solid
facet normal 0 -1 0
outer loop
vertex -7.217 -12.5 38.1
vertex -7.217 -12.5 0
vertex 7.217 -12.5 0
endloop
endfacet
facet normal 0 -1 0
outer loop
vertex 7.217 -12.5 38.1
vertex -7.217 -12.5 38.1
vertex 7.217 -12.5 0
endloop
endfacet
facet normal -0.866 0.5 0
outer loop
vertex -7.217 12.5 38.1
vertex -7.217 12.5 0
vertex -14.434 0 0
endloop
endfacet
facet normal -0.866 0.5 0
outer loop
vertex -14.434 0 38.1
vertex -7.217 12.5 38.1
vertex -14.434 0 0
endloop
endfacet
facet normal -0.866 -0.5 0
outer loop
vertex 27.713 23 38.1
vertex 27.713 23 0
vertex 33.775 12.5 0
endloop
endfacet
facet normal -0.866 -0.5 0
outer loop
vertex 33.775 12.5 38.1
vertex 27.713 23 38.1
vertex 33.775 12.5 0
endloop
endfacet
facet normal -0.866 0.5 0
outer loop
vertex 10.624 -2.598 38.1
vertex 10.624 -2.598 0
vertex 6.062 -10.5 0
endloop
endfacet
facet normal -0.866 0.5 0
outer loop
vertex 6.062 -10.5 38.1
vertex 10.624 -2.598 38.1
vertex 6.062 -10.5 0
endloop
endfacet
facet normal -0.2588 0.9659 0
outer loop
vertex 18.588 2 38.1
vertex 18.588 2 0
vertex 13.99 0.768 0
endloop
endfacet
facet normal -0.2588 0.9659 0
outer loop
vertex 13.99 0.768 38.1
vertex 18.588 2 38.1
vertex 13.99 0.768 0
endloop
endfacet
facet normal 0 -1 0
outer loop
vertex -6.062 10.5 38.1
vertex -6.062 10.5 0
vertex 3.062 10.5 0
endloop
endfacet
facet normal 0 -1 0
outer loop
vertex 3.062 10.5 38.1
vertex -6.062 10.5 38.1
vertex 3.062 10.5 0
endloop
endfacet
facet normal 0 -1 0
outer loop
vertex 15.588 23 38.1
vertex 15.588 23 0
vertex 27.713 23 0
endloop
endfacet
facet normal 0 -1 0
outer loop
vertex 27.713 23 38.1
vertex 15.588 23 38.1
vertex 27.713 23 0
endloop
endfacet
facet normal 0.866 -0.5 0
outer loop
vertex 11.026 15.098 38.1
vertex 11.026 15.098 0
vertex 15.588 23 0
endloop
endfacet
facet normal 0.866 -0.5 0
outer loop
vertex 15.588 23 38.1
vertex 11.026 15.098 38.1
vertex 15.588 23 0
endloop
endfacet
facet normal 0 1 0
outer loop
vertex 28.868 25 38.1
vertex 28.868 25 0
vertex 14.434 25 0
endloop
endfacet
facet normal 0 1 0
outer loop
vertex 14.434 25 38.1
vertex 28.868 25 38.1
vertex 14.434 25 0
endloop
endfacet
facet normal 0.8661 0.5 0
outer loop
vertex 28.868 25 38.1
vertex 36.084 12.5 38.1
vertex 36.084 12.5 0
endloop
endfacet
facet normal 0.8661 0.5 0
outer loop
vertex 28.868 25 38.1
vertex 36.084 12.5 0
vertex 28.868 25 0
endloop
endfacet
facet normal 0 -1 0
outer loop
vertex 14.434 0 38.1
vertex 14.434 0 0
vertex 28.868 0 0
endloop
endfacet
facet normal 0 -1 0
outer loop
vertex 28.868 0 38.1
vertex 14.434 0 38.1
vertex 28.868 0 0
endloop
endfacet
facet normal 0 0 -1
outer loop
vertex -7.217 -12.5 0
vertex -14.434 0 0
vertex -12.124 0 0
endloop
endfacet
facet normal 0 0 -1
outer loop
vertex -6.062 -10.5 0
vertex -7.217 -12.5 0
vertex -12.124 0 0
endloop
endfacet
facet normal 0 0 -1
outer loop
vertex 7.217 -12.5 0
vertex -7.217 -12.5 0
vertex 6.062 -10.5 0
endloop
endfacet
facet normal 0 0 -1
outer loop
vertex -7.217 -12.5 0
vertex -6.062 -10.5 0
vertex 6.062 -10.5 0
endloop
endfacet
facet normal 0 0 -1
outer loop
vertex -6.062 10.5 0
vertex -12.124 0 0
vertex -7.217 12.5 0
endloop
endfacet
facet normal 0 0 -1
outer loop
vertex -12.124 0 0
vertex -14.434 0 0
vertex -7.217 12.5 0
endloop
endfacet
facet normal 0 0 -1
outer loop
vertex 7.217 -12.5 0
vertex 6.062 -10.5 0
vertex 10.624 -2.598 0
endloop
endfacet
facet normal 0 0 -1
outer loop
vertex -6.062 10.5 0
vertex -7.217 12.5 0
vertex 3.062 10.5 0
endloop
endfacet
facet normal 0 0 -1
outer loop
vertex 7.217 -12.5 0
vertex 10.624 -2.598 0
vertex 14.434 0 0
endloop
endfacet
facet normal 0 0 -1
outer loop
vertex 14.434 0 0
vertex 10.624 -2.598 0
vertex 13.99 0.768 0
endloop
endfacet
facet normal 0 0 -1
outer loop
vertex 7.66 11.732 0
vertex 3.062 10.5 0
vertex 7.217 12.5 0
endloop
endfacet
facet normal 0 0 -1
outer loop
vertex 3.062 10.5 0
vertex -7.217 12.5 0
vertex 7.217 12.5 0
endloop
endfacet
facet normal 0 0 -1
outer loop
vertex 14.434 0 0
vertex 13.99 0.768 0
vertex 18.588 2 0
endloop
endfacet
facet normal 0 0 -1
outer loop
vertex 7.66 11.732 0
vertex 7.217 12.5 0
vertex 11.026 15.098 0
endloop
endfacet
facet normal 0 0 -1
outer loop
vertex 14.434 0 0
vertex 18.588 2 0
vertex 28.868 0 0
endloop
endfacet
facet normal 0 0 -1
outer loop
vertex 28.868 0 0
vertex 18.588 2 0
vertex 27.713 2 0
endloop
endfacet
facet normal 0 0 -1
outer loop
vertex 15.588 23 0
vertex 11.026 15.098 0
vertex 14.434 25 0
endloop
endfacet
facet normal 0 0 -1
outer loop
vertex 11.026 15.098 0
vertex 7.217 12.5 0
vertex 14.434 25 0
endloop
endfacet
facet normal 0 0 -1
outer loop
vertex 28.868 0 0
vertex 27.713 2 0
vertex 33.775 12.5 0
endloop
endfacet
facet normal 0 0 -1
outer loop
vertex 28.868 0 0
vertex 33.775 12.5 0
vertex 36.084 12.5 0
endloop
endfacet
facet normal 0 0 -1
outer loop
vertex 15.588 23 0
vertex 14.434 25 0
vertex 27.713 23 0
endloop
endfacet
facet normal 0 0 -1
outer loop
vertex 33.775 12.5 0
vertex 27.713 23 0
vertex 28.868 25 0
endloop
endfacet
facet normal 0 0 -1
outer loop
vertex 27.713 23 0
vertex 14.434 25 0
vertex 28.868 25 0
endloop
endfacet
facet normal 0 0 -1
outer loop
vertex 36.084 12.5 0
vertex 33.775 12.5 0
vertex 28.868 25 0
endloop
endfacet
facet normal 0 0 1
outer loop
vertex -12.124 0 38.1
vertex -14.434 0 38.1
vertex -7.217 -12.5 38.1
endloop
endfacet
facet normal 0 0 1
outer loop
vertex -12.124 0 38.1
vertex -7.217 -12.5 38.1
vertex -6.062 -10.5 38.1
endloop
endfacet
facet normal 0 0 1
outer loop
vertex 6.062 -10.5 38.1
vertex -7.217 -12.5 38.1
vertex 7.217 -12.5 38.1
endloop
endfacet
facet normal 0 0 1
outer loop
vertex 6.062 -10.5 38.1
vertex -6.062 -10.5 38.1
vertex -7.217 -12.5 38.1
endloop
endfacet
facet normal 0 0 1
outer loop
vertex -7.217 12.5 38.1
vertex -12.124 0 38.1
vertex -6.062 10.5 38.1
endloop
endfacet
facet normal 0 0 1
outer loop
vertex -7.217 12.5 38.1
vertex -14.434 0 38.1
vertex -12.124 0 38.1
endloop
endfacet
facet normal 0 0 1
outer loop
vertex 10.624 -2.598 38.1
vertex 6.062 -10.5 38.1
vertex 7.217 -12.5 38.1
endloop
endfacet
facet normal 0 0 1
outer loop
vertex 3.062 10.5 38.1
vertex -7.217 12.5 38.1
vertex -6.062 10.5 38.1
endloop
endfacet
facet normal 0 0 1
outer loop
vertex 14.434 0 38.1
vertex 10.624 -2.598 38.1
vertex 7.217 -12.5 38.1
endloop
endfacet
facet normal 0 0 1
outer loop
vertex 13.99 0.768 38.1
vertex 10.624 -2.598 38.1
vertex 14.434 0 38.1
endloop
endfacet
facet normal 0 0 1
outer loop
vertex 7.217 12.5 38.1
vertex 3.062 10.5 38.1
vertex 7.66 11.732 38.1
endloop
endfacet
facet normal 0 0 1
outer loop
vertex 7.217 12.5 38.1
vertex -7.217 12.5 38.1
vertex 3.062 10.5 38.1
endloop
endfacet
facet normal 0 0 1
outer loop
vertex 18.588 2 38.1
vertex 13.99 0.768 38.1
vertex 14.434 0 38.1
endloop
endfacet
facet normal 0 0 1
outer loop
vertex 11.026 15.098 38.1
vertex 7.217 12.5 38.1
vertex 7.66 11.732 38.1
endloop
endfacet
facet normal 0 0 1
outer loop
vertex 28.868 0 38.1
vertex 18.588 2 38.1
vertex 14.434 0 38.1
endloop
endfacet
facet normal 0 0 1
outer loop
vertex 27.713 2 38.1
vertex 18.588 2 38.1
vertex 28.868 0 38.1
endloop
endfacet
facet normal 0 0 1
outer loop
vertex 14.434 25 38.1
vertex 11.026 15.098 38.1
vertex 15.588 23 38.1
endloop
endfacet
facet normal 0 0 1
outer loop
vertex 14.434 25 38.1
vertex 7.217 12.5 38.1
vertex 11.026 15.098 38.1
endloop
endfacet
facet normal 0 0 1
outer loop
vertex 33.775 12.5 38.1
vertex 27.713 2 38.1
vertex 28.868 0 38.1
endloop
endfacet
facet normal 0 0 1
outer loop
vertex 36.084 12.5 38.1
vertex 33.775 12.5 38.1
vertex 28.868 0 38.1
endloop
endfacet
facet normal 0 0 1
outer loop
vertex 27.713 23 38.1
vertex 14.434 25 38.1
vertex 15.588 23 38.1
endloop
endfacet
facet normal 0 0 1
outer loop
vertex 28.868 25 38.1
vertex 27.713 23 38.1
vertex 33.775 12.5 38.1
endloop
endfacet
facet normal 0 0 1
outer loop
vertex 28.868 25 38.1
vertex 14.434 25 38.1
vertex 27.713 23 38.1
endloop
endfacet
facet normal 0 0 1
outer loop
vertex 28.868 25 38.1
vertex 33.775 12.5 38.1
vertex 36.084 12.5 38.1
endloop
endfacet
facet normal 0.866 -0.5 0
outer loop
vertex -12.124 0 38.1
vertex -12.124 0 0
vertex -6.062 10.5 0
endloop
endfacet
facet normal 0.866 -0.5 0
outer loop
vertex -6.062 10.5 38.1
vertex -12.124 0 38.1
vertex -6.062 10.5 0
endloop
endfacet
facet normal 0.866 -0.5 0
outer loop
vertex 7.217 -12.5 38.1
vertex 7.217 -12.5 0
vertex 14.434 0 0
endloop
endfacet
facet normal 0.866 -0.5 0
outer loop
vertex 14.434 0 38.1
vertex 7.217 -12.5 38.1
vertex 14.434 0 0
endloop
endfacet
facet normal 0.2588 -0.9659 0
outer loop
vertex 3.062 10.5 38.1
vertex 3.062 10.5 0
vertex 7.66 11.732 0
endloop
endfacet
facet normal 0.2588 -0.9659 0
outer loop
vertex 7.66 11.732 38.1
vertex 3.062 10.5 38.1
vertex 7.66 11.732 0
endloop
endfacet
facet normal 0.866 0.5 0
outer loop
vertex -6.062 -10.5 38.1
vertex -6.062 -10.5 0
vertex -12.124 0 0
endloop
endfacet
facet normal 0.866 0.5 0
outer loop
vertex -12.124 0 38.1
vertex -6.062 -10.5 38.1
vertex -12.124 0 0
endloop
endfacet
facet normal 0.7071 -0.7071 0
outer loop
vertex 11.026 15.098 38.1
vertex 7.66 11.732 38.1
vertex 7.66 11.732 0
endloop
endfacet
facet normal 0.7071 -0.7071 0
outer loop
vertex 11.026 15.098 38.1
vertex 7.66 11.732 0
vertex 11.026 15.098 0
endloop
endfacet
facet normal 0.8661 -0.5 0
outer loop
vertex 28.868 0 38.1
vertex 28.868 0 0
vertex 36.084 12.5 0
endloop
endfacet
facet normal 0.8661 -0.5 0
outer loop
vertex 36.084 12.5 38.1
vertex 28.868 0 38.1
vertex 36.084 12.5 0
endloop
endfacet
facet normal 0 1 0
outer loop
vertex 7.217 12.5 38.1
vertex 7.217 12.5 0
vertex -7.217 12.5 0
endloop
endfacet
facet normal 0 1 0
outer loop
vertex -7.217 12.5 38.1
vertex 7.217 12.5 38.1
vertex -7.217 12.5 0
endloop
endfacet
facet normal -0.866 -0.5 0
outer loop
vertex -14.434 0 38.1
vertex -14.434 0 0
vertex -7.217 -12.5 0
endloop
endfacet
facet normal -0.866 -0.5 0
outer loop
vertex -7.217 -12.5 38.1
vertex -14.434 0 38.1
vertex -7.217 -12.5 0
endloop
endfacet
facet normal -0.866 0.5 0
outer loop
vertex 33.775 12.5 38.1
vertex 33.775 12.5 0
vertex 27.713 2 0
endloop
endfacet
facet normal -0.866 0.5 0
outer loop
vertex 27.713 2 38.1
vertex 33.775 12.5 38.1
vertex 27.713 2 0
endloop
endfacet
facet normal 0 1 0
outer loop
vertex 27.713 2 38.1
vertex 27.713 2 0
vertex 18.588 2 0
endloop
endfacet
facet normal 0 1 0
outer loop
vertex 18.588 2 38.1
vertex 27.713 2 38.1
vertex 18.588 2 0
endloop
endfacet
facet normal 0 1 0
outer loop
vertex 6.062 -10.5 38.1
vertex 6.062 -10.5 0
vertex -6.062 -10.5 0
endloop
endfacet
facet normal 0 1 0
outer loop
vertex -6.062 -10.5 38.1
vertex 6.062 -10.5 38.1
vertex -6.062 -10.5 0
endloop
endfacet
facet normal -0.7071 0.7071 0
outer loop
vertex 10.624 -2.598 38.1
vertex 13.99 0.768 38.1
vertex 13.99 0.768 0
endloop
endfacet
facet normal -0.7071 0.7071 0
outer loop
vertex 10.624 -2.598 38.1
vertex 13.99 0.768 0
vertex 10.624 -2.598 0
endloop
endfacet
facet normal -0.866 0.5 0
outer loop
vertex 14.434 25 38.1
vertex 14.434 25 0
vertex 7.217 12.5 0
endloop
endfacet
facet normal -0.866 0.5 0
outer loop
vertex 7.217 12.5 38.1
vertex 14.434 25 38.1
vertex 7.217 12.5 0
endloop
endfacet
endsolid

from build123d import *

# Parameters (mm, degrees)
F1_DEPTH    = 38.1
F2_T1_DEPTH = 53.6803294212


# Not quite as in the source:
# - a fillet or chamfer that OpenCascade refuses, or shapes differently, is made with other operations: its cross-section is extruded or revolved along the edge and cut away or added


with BuildPart() as f1:
    # F0 (on Top) → F1 (new body)
    with BuildSketch(Plane.XY):
        Polygon((-7.2168783649, -12.5), (7.2168783649, -12.5), (14.4337567297, 0), (28.8675134595, 0), (36.0843918244, 12.5), (28.8675134595, 25), (14.4337567297, 25), (7.2168783649, 12.5), (-7.2168783649, 12.5), (-14.4337567297, 0), align=None)
        Polygon((12.124355653, 0), (6.0621778265, -10.5), (-6.0621778265, -10.5), (-12.124355653, 0), (-6.0621778265, 10.5), (6.0621778265, 10.5), (9.5262794416, 12.5), (15.5884572681, 23), (27.7128129211, 23), (33.7749907476, 12.5), (27.7128129211, 2), (15.5884572681, 2), align=None, mode=Mode.SUBTRACT)
    extrude(amount=F1_DEPTH)

    # F2: chamfer of 3 on 4 edges, made by hand

    # F2_s2 → F2_t1 (cut)
    with BuildSketch(Plane.XY.offset(-7.7901647106)):
        Polygon((3.0621778265, 10.5), (8.6602540378, 12), (6.0621778265, 10.5), align=None)
        Polygon((6.9282032303, 11), (11.0262794416, 15.0980762114), (9.5262794416, 12.5), align=None)
        Polygon((14.7224318643, 1.5), (10.624355653, -2.5980762114), (12.124355653, 0), align=None)
        Polygon((18.5884572681, 2), (12.9903810568, 0.5), (15.5884572681, 2), align=None)
    extrude(amount=F2_T1_DEPTH, mode=Mode.SUBTRACT)


solid = f1.part
